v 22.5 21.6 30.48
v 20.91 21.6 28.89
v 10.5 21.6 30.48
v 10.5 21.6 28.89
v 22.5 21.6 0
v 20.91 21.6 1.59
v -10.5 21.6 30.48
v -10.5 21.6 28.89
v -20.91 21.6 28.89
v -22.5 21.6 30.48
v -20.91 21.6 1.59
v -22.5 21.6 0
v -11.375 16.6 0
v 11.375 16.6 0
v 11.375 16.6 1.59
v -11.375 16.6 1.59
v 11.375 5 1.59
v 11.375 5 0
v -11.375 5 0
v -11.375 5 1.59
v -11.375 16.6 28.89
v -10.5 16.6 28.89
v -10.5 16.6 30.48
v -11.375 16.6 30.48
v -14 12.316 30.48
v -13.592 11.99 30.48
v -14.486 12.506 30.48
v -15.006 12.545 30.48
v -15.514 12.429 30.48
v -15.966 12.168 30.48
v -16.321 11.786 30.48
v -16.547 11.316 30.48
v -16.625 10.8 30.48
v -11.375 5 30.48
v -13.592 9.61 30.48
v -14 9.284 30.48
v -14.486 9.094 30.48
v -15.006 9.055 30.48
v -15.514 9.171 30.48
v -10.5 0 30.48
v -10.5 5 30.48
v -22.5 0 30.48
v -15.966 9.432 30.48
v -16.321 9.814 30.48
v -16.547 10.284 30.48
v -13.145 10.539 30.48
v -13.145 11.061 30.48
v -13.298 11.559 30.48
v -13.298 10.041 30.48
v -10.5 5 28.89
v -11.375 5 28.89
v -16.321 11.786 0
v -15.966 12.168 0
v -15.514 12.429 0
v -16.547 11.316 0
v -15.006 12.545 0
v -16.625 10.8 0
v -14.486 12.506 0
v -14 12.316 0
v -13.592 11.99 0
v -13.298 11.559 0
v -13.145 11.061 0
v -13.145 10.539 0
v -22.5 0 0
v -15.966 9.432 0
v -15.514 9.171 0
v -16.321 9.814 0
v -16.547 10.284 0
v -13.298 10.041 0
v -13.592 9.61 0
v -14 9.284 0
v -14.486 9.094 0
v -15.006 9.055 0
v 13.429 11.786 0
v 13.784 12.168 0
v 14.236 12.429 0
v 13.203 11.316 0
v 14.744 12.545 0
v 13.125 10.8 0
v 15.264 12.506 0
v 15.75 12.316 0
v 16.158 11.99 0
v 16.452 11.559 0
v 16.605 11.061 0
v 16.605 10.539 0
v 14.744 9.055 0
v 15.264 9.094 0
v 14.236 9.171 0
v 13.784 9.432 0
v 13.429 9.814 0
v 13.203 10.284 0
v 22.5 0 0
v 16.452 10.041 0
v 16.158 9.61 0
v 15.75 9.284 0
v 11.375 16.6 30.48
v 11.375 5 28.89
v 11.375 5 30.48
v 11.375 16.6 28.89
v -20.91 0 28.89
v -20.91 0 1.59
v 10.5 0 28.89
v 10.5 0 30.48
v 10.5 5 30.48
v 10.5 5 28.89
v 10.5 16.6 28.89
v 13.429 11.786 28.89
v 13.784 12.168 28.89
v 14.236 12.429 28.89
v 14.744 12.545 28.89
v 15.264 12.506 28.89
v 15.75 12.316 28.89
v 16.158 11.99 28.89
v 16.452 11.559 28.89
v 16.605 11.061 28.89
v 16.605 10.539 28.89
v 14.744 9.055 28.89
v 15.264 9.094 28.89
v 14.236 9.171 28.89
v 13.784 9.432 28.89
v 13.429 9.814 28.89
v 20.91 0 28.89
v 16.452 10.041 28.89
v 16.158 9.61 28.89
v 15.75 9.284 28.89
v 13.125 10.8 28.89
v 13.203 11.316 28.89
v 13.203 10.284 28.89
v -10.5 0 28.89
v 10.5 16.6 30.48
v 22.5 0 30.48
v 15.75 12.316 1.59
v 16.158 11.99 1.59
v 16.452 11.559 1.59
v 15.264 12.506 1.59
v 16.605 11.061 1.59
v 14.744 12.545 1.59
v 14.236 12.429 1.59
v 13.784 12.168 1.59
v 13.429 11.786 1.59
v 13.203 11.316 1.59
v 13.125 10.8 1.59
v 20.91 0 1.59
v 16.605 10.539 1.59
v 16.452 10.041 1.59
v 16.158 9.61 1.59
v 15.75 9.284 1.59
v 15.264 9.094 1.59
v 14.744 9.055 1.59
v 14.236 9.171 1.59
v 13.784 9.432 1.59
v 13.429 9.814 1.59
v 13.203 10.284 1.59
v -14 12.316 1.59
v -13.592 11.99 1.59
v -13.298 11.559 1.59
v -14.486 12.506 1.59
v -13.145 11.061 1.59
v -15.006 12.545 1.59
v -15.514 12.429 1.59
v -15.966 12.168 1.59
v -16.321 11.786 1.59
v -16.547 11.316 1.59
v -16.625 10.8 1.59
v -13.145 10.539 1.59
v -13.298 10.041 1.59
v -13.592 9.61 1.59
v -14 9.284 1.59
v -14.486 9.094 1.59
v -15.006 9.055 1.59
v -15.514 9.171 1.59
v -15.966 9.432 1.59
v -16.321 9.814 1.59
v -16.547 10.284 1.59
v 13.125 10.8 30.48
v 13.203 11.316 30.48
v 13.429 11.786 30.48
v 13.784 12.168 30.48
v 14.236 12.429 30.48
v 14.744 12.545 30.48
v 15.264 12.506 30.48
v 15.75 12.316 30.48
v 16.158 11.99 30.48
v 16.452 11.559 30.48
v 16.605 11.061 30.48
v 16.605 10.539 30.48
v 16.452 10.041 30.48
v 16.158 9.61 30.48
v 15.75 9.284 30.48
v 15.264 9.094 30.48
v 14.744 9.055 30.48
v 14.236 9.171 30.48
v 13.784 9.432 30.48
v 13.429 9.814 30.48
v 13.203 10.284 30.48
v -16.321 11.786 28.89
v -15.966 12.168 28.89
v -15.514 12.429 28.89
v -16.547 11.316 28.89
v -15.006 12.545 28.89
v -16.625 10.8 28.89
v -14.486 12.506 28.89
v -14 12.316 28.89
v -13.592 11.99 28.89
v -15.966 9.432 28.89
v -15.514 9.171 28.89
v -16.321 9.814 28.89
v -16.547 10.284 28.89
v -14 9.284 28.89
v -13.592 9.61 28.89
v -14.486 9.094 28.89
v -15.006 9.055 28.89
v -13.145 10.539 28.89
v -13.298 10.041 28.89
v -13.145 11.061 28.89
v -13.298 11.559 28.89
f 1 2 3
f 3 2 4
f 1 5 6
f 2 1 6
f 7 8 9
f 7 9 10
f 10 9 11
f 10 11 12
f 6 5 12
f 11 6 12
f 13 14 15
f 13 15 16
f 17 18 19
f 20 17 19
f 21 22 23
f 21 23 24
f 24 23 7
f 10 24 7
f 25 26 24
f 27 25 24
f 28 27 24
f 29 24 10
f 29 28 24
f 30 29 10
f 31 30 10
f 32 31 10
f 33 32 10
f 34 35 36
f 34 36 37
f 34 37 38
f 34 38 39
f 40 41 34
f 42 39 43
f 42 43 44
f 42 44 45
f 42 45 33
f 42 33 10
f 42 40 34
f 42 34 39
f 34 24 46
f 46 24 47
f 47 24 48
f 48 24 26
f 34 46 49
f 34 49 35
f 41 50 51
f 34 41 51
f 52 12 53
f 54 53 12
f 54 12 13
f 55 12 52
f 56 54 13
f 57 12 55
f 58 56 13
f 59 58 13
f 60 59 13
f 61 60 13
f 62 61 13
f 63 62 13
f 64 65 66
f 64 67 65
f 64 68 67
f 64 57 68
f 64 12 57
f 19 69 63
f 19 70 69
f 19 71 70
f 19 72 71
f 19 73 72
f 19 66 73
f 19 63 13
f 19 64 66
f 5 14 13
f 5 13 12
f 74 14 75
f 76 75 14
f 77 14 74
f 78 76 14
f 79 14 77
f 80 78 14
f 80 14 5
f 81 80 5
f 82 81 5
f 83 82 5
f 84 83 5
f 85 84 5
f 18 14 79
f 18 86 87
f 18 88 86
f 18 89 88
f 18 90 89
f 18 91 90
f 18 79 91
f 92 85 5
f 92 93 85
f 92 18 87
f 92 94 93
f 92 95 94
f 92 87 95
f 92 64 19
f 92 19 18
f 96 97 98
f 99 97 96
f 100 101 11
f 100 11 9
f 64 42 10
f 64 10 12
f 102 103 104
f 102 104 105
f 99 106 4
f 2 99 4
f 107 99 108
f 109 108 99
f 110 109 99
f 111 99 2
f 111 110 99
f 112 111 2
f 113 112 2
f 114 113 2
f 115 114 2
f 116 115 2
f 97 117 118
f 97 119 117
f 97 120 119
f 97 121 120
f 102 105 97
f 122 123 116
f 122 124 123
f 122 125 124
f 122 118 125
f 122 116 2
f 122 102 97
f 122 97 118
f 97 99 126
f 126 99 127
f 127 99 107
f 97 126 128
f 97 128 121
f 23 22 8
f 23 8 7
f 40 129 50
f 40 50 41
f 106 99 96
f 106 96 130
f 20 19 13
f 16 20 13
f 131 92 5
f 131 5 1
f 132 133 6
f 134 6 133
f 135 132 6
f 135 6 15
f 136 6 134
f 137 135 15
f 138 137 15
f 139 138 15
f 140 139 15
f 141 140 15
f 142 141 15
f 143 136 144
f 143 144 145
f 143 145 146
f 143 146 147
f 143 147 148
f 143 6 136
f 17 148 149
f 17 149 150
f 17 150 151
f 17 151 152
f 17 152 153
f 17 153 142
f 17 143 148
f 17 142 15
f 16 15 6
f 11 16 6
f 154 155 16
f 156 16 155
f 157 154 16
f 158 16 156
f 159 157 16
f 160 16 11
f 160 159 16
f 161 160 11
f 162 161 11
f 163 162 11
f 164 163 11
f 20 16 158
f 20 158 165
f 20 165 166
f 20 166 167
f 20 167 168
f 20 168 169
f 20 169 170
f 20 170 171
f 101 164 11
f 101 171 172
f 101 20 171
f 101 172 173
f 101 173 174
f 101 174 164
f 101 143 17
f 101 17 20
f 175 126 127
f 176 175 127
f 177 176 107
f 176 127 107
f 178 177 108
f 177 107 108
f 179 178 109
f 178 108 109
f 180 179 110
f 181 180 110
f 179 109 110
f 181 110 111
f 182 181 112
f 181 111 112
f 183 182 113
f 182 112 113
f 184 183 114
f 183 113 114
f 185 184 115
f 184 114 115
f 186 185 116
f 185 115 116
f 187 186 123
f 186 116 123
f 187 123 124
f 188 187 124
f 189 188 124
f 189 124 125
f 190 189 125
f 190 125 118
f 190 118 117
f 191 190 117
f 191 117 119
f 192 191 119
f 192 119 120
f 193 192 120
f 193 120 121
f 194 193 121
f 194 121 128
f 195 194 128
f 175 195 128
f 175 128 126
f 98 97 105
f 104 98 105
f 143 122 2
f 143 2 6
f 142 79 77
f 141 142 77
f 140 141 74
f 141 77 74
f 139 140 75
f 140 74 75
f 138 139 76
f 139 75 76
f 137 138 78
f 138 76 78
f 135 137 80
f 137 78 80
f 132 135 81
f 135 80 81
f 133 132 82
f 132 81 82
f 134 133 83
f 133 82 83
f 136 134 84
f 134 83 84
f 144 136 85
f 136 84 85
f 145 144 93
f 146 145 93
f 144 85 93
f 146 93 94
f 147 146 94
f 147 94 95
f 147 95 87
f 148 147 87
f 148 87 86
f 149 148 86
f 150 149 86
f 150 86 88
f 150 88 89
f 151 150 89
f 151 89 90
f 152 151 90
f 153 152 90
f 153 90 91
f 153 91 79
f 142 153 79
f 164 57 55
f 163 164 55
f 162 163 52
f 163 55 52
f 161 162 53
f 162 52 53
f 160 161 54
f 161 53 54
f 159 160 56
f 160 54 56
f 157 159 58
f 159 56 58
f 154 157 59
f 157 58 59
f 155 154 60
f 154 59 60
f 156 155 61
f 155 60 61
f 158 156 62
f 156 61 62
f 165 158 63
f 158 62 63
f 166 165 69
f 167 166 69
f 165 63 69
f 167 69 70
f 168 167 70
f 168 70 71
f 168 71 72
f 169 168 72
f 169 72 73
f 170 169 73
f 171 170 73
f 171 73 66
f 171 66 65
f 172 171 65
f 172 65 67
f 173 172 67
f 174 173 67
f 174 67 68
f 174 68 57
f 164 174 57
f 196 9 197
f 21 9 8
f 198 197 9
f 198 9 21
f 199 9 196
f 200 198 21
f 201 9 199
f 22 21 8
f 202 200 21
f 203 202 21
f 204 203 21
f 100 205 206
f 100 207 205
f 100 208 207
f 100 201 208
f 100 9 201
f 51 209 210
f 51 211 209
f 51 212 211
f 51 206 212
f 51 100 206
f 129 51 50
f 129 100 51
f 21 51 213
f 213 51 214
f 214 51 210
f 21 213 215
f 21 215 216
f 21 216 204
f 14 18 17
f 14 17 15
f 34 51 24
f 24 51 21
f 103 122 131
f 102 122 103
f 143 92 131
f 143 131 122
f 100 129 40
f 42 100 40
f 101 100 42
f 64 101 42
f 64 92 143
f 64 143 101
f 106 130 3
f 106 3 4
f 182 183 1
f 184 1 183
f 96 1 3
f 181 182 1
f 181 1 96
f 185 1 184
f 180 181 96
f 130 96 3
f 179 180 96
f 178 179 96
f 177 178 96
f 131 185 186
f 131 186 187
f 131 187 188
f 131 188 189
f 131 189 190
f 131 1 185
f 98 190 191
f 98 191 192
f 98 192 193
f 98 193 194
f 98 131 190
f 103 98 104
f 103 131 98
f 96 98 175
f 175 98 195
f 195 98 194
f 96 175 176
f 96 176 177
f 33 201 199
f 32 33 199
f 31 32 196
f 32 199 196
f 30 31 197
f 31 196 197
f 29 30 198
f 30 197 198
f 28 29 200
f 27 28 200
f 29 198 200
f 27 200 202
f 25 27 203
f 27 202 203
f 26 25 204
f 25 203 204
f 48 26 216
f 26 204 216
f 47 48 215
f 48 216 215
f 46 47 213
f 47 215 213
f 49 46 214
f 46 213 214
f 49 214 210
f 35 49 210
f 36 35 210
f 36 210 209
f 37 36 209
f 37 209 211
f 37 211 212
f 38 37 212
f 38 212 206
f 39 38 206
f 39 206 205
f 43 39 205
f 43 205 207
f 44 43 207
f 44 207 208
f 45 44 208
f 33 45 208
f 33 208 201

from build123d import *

# Parameters (mm, degrees)
BOSS_EXTRUDE1_DEPTH = 21.6
SKETCH4_R           = 1.75
SKETCH4_W           = 22.75
SKETCH4_H           = 11.6
CUT_EXTRUDE2_DEPTH  = 50


with BuildPart() as part:
    # Sketch2 → Boss-Extrude1 (new body)
    with BuildSketch(Plane(origin=(0, 0, 0), x_dir=(1, 0, 0), z_dir=(0, 1, 0))):
        Polygon((-22.5, 0), (22.5, 0), (22.5, -30.48), (10.5, -30.48), (10.5, -28.89), (20.91, -28.89), (20.91, -1.59), (-20.91, -1.59), (-20.91, -28.89), (-10.5, -28.89), (-10.5, -30.48), (-22.5, -30.48), align=None)
    extrude(amount=BOSS_EXTRUDE1_DEPTH)

    # Sketch4 → Cut-Extrude2 (cut)
    with BuildSketch(Plane(origin=(0, 0, 0), x_dir=(-1, 0, 0), z_dir=(0, 0, -1))):
        with Locations((-14.875, 10.8)):
            Circle(SKETCH4_R)
        with Locations((14.875, 10.8)):
            Circle(SKETCH4_R)
        with Locations((0, 10.8)):
            Rectangle(SKETCH4_W, SKETCH4_H)
    extrude(amount=-CUT_EXTRUDE2_DEPTH, mode=Mode.SUBTRACT)


solid = part.part
